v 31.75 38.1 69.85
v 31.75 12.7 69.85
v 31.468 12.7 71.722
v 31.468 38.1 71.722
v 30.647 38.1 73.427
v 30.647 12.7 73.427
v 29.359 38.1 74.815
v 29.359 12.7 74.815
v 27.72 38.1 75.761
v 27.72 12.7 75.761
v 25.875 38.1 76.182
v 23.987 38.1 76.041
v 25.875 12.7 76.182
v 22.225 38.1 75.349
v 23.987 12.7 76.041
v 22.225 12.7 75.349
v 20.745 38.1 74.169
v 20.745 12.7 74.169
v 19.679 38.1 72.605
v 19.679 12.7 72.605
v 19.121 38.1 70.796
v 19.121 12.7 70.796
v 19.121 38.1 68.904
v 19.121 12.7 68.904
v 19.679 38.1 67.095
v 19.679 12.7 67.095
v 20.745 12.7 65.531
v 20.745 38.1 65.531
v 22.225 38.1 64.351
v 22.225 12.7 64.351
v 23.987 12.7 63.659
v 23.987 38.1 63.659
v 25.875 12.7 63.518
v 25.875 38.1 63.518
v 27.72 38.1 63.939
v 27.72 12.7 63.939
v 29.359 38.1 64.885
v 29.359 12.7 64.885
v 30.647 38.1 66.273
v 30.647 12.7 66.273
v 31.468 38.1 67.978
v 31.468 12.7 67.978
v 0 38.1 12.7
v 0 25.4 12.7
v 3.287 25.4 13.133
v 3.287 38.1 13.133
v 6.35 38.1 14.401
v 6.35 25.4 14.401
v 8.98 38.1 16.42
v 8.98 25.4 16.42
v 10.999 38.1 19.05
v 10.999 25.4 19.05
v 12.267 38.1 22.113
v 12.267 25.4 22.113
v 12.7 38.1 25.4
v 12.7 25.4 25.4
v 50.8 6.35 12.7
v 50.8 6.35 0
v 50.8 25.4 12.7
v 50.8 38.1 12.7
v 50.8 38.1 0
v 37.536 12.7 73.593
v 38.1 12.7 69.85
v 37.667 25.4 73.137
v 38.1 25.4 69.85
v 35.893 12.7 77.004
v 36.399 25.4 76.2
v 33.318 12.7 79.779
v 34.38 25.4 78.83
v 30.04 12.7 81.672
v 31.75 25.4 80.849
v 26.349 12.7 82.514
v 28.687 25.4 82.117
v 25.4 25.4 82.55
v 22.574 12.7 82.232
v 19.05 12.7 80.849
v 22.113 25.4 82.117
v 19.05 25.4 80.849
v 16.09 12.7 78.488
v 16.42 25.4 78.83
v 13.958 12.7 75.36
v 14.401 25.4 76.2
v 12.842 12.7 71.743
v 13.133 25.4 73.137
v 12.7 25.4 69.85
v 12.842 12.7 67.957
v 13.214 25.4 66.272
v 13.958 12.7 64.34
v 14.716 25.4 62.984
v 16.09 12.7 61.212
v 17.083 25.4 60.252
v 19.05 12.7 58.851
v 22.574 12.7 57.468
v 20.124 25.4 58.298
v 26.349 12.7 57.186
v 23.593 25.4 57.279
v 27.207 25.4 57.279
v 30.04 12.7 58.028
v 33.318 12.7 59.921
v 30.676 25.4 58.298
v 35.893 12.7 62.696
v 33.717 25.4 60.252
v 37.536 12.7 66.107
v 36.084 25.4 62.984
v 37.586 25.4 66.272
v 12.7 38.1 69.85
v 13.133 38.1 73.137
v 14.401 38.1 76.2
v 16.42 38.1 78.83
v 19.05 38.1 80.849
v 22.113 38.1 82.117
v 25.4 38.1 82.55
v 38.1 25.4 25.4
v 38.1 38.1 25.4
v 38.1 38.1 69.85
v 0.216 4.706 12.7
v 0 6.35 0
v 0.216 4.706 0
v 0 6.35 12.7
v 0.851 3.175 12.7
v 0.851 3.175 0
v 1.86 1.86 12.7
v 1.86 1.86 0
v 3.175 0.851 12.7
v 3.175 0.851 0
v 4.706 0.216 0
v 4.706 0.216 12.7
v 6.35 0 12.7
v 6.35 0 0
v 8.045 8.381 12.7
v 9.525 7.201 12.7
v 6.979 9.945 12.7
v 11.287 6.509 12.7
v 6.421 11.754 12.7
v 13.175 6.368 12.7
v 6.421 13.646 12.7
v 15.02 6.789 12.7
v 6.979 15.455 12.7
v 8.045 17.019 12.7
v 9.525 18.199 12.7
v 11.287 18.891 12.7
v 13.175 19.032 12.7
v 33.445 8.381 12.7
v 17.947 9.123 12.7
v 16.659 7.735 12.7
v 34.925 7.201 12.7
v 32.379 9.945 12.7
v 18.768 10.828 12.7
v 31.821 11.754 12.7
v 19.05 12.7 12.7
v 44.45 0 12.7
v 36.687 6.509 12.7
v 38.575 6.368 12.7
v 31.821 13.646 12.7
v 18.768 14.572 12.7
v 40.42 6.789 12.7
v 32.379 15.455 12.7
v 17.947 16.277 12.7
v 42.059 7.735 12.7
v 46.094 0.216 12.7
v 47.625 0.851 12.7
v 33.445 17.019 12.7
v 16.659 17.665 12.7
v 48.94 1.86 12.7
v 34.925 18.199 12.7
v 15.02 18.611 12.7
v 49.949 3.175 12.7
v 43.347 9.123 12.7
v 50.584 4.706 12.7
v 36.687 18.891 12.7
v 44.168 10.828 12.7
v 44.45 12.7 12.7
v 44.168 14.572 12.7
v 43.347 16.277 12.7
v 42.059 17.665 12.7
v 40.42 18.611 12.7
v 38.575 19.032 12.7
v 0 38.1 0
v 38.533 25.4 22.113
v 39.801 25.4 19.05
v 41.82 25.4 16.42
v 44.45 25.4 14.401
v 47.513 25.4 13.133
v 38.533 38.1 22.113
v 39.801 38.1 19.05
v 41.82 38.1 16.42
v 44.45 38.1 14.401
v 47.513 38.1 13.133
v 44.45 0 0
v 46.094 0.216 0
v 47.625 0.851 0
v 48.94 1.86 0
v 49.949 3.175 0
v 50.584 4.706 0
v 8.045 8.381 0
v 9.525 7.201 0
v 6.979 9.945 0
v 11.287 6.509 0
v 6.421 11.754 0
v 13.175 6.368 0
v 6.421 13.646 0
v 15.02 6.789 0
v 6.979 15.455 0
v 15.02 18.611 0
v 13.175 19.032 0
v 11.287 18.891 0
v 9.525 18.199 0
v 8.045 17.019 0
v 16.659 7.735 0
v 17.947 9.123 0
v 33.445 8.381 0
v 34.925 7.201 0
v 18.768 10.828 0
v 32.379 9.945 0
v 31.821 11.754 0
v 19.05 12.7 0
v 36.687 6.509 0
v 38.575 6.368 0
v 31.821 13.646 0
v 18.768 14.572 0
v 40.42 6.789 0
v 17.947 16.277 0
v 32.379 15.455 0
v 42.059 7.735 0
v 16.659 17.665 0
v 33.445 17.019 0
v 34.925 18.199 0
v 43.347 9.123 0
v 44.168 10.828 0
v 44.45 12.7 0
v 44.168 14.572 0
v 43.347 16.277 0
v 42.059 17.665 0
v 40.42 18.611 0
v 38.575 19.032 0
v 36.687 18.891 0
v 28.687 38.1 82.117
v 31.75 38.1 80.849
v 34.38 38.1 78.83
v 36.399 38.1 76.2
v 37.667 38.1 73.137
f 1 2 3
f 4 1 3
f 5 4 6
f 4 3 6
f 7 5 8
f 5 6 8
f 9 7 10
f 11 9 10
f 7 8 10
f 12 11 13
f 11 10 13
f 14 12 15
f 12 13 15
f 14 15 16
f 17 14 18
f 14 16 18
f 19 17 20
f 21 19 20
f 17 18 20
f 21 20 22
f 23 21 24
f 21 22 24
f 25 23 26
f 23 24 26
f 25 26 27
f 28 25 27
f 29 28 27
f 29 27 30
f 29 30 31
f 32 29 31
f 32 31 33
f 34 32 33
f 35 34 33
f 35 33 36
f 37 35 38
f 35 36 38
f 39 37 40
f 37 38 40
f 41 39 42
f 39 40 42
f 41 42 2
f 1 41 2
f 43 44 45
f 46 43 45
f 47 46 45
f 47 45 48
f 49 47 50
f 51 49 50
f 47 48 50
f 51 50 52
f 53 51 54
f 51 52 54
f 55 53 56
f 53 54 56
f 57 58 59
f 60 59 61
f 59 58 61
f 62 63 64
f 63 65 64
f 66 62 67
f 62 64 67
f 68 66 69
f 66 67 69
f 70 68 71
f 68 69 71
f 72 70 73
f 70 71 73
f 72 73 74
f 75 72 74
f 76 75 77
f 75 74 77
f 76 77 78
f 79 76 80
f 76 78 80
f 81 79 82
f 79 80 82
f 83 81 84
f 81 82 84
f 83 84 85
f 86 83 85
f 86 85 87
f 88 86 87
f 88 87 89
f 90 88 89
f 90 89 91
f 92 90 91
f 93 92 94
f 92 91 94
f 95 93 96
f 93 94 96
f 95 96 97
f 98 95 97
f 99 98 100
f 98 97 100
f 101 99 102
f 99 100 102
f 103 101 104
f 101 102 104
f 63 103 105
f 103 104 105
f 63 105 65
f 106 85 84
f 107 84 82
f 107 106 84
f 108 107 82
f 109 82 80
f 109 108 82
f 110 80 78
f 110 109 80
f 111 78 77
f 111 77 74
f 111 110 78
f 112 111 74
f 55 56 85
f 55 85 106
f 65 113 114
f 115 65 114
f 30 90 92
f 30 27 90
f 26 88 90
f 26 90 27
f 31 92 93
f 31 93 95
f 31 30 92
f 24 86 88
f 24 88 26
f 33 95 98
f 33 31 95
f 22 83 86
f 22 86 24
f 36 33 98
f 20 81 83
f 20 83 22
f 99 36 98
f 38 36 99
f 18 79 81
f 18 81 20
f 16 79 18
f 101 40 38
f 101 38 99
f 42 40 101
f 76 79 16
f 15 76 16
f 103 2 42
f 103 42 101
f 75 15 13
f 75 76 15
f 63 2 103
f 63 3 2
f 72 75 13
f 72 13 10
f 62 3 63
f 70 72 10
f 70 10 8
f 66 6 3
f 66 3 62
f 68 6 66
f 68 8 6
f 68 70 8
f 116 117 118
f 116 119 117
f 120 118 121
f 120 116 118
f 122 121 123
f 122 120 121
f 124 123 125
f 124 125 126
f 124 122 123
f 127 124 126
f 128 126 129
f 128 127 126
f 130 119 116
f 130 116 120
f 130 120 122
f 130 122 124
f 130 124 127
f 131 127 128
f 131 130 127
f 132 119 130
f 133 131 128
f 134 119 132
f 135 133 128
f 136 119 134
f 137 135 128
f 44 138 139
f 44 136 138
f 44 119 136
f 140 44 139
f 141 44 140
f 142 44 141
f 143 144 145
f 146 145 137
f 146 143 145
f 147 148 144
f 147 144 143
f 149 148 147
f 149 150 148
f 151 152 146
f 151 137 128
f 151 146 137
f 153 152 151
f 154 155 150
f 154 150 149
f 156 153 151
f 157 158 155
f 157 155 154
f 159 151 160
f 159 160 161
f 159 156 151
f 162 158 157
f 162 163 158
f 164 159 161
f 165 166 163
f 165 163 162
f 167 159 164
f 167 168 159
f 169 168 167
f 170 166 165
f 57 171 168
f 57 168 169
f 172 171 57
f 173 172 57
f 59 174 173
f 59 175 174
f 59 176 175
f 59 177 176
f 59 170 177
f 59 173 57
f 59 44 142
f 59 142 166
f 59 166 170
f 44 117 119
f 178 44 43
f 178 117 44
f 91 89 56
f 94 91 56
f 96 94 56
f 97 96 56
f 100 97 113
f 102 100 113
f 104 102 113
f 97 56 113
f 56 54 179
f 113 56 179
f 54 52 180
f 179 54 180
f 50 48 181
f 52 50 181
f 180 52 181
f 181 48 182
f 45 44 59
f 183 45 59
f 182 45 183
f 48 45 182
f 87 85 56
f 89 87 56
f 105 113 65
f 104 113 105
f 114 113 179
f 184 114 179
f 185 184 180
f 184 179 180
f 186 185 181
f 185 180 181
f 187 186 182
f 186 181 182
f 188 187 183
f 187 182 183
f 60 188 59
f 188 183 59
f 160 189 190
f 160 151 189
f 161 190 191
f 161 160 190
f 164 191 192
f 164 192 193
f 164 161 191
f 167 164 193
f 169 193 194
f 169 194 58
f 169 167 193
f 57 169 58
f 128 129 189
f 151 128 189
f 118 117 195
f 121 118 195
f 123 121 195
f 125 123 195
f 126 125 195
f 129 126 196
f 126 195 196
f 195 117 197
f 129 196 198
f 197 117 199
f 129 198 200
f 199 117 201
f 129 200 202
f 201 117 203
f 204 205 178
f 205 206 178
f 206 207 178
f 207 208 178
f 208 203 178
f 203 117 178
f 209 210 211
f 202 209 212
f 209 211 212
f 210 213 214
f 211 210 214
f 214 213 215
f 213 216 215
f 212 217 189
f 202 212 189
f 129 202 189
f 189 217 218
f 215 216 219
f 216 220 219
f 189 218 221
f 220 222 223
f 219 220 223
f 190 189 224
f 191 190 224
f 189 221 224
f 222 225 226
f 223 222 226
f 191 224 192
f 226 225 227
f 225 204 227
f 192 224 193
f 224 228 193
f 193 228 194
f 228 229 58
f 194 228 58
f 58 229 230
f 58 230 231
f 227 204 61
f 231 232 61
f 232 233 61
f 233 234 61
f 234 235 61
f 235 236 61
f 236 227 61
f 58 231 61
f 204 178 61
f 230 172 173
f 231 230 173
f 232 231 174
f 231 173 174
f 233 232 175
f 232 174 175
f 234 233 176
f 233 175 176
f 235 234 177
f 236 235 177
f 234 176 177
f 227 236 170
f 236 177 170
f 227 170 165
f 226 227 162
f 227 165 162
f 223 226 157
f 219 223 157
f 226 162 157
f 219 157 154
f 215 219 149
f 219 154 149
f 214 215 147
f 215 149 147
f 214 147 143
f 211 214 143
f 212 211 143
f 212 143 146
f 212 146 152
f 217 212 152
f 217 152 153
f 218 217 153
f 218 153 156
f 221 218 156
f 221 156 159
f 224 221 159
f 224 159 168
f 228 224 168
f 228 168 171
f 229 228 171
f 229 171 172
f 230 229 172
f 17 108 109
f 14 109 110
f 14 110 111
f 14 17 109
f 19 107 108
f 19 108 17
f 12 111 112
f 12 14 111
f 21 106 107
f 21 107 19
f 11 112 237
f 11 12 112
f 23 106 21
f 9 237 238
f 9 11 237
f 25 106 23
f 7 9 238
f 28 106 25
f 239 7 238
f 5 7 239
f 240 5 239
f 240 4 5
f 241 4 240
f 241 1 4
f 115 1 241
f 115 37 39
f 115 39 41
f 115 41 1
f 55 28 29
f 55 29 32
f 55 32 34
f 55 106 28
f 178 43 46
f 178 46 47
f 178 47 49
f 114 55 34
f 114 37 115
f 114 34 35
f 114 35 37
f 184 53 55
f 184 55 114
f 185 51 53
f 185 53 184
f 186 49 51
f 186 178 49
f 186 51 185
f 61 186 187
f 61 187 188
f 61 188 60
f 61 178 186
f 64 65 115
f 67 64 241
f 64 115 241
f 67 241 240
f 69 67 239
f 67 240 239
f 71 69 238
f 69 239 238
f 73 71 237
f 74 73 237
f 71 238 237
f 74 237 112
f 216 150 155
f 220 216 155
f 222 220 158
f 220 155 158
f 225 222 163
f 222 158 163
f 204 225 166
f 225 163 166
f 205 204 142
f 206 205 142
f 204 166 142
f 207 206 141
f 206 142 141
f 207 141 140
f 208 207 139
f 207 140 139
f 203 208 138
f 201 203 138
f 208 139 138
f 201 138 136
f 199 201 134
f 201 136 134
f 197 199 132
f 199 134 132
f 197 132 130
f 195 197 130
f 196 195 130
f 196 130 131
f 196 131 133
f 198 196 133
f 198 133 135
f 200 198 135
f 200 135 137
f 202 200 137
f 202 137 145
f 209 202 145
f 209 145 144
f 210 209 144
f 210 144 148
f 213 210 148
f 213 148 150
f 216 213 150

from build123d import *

# Parameters (mm, degrees)
F0_W      = 50.8
F0_H      = 38.1
F1_DEPTH  = 12.7
F2_R      = 6.35
F3_R      = 6.35
F4_DEPTH  = 25.4
F5_W      = 25.4
F5_H      = 12.7
F6_DEPTH  = 69.85
F7_R      = 12.69999
F8_W      = 12.7
F8_H      = 12.7
F9_DEPTH  = 12.7
F11_DEPTH = 25.4
F12_R     = 12.7
F13_DEPTH = 12.7
F14_R     = 6.35
F15_DEPTH = 25.4


# Not quite as in the source:
# - a fillet or chamfer is up to 0.001 mm smaller than in the source, because OpenCascade refuses the exact size


with BuildPart() as f1:
    # F0 (on Top) → F1 (new body)
    with BuildSketch(Plane.XY):
        with Locations((25.4, 19.05)):
            Rectangle(F0_W, F0_H)
    extrude(amount=F1_DEPTH)

    # F2
    f2_edges = [f1.edges().sort_by_distance(p)[0] for p in [
        (0, 0, 6.35),
        (50.8, 0, 6.35),
    ]]
    fillet(f2_edges, radius=F2_R)

    # F3 (on face) → F4 (cut)
    with BuildSketch(Plane.XY.offset(12.7)):
        with Locations((12.7, 12.7)):
            Circle(F3_R)
        with Locations((38.1, 12.7)):
            Circle(F3_R)
    extrude(amount=-F4_DEPTH, mode=Mode.SUBTRACT)

    # F5 (on face) → F6 (join)
    with BuildSketch(Plane.XY.offset(12.7)):
        with Locations((25.4, 31.75)):
            Rectangle(F5_W, F5_H)
    extrude(amount=F6_DEPTH)

    # F7 (radius 12.7 in the source; OpenCascade refuses exactly that, so slightly less here)
    f7_edges = [f1.edges().sort_by_distance(p)[0] for p in [
        (38.1, 31.75, 82.55),
        (12.7, 31.75, 82.55),
    ]]
    fillet(f7_edges, radius=F7_R)

    # F8 (on face) → F9 (join)
    with BuildSketch(Plane.XY.offset(12.7)):
        with Locations((6.35, 31.75)):
            Rectangle(F8_W, F8_H)
        with Locations((44.45, 31.75)):
            Rectangle(F8_W, F8_H)
    extrude(amount=F9_DEPTH)

    # F10 (on face) → F11 (cut)
    with BuildSketch(Plane.XZ.offset(-25.4)):
        with BuildLine():
            Line((0, 25.4), (0, 12.7))
            ThreePointArc((0, 12.7), (8.9802561211, 16.4197438789), (12.7, 25.4))
            Line((12.7, 25.4), (0, 25.4))
        make_face()
        with BuildLine():
            ThreePointArc((38.1, 25.4), (41.8197438789, 16.4197438789), (50.8, 12.7))
            Line((50.8, 12.7), (50.8, 25.4))
            Line((50.8, 25.4), (38.1, 25.4))
        make_face()
    extrude(amount=-F11_DEPTH, mode=Mode.SUBTRACT)

    # F12 (on face) → F13 (join)
    with BuildSketch(Plane.XZ.offset(-25.4)):
        with Locations((25.4, 69.85)):
            Circle(F12_R)
    extrude(amount=F13_DEPTH)

    # F14 (on face) → F15 (cut)
    with BuildSketch(Plane.XZ.offset(-12.7)):
        with Locations((25.4, 69.85)):
            Circle(F14_R)
    extrude(amount=-F15_DEPTH, mode=Mode.SUBTRACT)


solid = f1.part
